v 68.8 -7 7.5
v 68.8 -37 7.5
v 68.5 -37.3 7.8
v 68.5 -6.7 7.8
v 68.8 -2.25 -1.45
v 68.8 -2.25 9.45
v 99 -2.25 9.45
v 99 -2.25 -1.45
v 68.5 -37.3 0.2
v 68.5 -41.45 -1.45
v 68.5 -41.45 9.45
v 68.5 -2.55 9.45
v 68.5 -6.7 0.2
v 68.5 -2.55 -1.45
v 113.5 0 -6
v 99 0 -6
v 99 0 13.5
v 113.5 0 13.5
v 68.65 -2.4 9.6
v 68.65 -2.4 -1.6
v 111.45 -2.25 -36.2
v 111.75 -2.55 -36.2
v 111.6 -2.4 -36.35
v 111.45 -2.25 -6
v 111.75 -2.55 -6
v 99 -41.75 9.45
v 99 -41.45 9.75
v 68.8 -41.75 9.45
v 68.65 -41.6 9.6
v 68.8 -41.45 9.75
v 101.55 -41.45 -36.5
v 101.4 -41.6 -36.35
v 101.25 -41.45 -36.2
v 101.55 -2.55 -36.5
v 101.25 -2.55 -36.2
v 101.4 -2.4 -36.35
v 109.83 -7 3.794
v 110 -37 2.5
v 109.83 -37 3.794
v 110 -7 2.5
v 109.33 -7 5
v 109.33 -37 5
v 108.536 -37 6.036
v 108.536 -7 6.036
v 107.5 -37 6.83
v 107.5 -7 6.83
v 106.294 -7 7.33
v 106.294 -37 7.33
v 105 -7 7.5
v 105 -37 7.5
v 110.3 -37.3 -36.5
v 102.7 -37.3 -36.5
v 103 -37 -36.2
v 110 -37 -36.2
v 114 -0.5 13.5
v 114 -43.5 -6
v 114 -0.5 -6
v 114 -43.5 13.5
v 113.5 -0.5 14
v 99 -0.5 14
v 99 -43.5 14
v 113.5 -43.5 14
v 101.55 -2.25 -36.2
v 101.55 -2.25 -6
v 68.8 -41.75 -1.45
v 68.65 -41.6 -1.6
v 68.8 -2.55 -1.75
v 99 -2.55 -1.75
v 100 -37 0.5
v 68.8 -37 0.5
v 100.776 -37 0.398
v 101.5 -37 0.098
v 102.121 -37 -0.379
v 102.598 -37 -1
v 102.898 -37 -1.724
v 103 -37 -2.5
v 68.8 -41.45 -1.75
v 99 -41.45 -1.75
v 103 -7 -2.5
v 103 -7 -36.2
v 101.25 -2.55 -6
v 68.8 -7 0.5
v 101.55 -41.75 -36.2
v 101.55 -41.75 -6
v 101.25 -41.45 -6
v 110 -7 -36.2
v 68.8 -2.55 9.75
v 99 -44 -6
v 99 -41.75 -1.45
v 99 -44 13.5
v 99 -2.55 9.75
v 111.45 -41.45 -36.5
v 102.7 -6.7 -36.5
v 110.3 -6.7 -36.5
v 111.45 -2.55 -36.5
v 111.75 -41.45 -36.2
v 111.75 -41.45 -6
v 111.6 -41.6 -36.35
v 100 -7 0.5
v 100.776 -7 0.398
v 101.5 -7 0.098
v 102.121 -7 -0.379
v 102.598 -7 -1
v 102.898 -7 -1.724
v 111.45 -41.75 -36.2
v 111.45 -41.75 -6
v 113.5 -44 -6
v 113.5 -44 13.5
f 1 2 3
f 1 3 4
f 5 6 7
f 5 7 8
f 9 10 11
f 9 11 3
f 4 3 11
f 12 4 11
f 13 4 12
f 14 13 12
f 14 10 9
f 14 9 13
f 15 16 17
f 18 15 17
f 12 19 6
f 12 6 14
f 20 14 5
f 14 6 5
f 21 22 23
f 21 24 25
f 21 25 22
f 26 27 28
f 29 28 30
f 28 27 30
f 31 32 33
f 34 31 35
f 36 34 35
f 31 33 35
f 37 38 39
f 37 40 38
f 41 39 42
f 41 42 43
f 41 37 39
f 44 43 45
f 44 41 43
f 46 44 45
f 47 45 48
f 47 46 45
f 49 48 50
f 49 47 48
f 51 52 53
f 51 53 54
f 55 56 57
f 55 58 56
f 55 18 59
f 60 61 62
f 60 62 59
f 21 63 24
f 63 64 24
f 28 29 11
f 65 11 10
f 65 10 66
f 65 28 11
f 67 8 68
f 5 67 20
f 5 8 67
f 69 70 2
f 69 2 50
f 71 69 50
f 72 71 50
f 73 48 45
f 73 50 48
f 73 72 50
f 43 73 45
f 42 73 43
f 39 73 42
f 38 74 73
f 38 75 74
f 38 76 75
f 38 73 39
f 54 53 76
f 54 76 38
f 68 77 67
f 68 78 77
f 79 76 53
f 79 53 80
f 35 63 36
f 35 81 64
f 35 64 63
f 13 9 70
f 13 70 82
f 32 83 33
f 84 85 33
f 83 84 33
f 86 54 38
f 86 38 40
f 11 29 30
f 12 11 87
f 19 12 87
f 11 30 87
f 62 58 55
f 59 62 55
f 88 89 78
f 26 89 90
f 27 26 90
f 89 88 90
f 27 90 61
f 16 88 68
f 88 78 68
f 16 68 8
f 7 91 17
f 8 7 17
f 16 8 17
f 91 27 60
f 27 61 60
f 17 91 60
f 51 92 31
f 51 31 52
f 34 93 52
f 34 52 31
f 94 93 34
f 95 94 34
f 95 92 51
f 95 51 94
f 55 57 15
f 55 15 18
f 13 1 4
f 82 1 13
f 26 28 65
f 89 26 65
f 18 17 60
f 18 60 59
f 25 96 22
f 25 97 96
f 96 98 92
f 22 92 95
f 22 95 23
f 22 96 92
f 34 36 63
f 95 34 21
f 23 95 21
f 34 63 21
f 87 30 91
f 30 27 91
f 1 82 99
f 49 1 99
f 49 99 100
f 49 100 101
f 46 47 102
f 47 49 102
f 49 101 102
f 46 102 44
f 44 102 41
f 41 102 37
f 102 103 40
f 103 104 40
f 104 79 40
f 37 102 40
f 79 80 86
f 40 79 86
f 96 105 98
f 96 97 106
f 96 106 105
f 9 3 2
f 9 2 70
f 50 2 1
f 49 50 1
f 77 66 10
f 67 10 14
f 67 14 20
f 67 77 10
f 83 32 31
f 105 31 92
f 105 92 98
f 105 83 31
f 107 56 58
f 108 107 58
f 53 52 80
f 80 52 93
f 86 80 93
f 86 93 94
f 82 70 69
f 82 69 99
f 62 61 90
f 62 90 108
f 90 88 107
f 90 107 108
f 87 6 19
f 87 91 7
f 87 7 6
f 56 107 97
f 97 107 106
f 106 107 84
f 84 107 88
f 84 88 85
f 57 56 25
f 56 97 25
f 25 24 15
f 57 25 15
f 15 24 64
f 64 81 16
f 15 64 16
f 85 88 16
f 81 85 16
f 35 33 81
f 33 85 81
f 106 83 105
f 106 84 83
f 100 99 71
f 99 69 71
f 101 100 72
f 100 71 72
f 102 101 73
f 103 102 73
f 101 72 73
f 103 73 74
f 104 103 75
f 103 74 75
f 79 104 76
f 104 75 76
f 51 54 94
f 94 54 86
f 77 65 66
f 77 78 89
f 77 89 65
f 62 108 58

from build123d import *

# Parameters (mm, degrees)
SKETCH014_W     = 44
SKETCH014_H     = 20
PAD004_DEPTH    = 15
SKETCH015_W     = 39.5
SKETCH015_H     = 11.5
PAD005_DEPTH    = 30.5
SKETCH016_W     = 30
SKETCH016_H     = 7
POCKET005_DEPTH = 41.5
SKETCH017_W     = 39.5
SKETCH017_H     = 10.5
PAD006_DEPTH    = 30.5
SKETCH018_W     = 30
SKETCH018_H     = 7
POCKET006_DEPTH = 44
FILLET006_R     = 5
FILLET007_R     = 3
CHAMFER032_SIZE = 0.3
CHAMFER033_SIZE = 0.5
CHAMFER034_SIZE = 0.3


with BuildPart() as part:
    # Sketch014 → Pad004 (new body)
    with BuildSketch(Plane.YZ):
        Rectangle(SKETCH014_W, SKETCH014_H)
    extrude(amount=PAD004_DEPTH)

    # Sketch015 (on DatumPlane) → Pad005 (join)
    with BuildSketch(Plane(origin=(0, 0, 0), x_dir=(0, 1, 0), z_dir=(-1, 0, 0))):
        Rectangle(SKETCH015_W, SKETCH015_H)
    extrude(amount=PAD005_DEPTH)

    # Sketch016 (on Face11 of Pad005) → Pocket005 (cut)
    with BuildSketch(Plane(origin=(-30.5, 0, 0), x_dir=(0, 1, 0), z_dir=(-1, 0, 0))):
        Rectangle(SKETCH016_W, SKETCH016_H)
    extrude(amount=-POCKET005_DEPTH, mode=Mode.SUBTRACT)

    # Sketch017 (on DatumPlane) → Pad006 (join)
    with BuildSketch(Plane.YX.offset(10)):
        with Locations((0, 7.5)):
            Rectangle(SKETCH017_W, SKETCH017_H)
    extrude(amount=PAD006_DEPTH)

    # Sketch018 (on Face16 of Pad006) → Pocket006 (cut)
    with BuildSketch(Plane.YX.offset(40.5)):
        with Locations((0, 7.5)):
            Rectangle(SKETCH018_W, SKETCH018_H)
    extrude(amount=-POCKET006_DEPTH, mode=Mode.SUBTRACT)

    # Fillet006
    fillet006_edges = [part.edges().sort_by_distance(p)[0] for p in [
        (11, 0, 3.5),
    ]]
    fillet(fillet006_edges, radius=FILLET006_R)

    # Fillet007
    fillet007_edges = [part.edges().sort_by_distance(p)[0] for p in [
        (4, 0, -3.5),
    ]]
    fillet(fillet007_edges, radius=FILLET007_R)

    # Chamfer032
    chamfer032_edges = [part.edges().sort_by_distance(p)[0] for p in [
        (-30.5, 0, -5.75),
        (-30.5, -19.75, 0),
        (-30.5, 19.75, 0),
        (-30.5, 0, 5.75),
        (-30.5, 0, -3.5),
        (-30.5, 15, 0),
        (-30.5, 0, 3.5),
        (-30.5, -15, 0),
        (12.75, 0, -40.5),
        (7.5, -19.75, -40.5),
        (7.5, 19.75, -40.5),
        (2.25, 0, -40.5),
        (11, 0, -40.5),
        (7.5, 15, -40.5),
        (4, 0, -40.5),
        (7.5, -15, -40.5),
    ]]
    chamfer(chamfer032_edges, length=CHAMFER032_SIZE)

    # Chamfer033
    chamfer033_edges = [part.edges().sort_by_distance(p)[0] for p in [
        (7.5, -22, 10),
        (15, -22, 0),
        (7.5, 22, 10),
        (15, 22, 0),
        (15, 0, 10),
    ]]
    chamfer(chamfer033_edges, length=CHAMFER033_SIZE)

    # Chamfer034
    chamfer034_edges = [part.edges().sort_by_distance(p)[0] for p in [
        (-15.1, -19.75, 5.75),
        (-15.1, -19.75, -5.75),
        (-15.1, 19.75, 5.75),
        (-15.1, 19.75, -5.75),
        (2.25, 19.75, -25.1),
        (2.25, -19.75, -25.1),
        (12.75, 19.75, -25.1),
        (12.75, -19.75, -25.1),
    ]]
    chamfer(chamfer034_edges, length=CHAMFER034_SIZE)


with BuildPart() as part_1:
    # Body002 placement: moved
    add(part.part.moved(Location((99, -22, 4))))


solid = part_1.part
